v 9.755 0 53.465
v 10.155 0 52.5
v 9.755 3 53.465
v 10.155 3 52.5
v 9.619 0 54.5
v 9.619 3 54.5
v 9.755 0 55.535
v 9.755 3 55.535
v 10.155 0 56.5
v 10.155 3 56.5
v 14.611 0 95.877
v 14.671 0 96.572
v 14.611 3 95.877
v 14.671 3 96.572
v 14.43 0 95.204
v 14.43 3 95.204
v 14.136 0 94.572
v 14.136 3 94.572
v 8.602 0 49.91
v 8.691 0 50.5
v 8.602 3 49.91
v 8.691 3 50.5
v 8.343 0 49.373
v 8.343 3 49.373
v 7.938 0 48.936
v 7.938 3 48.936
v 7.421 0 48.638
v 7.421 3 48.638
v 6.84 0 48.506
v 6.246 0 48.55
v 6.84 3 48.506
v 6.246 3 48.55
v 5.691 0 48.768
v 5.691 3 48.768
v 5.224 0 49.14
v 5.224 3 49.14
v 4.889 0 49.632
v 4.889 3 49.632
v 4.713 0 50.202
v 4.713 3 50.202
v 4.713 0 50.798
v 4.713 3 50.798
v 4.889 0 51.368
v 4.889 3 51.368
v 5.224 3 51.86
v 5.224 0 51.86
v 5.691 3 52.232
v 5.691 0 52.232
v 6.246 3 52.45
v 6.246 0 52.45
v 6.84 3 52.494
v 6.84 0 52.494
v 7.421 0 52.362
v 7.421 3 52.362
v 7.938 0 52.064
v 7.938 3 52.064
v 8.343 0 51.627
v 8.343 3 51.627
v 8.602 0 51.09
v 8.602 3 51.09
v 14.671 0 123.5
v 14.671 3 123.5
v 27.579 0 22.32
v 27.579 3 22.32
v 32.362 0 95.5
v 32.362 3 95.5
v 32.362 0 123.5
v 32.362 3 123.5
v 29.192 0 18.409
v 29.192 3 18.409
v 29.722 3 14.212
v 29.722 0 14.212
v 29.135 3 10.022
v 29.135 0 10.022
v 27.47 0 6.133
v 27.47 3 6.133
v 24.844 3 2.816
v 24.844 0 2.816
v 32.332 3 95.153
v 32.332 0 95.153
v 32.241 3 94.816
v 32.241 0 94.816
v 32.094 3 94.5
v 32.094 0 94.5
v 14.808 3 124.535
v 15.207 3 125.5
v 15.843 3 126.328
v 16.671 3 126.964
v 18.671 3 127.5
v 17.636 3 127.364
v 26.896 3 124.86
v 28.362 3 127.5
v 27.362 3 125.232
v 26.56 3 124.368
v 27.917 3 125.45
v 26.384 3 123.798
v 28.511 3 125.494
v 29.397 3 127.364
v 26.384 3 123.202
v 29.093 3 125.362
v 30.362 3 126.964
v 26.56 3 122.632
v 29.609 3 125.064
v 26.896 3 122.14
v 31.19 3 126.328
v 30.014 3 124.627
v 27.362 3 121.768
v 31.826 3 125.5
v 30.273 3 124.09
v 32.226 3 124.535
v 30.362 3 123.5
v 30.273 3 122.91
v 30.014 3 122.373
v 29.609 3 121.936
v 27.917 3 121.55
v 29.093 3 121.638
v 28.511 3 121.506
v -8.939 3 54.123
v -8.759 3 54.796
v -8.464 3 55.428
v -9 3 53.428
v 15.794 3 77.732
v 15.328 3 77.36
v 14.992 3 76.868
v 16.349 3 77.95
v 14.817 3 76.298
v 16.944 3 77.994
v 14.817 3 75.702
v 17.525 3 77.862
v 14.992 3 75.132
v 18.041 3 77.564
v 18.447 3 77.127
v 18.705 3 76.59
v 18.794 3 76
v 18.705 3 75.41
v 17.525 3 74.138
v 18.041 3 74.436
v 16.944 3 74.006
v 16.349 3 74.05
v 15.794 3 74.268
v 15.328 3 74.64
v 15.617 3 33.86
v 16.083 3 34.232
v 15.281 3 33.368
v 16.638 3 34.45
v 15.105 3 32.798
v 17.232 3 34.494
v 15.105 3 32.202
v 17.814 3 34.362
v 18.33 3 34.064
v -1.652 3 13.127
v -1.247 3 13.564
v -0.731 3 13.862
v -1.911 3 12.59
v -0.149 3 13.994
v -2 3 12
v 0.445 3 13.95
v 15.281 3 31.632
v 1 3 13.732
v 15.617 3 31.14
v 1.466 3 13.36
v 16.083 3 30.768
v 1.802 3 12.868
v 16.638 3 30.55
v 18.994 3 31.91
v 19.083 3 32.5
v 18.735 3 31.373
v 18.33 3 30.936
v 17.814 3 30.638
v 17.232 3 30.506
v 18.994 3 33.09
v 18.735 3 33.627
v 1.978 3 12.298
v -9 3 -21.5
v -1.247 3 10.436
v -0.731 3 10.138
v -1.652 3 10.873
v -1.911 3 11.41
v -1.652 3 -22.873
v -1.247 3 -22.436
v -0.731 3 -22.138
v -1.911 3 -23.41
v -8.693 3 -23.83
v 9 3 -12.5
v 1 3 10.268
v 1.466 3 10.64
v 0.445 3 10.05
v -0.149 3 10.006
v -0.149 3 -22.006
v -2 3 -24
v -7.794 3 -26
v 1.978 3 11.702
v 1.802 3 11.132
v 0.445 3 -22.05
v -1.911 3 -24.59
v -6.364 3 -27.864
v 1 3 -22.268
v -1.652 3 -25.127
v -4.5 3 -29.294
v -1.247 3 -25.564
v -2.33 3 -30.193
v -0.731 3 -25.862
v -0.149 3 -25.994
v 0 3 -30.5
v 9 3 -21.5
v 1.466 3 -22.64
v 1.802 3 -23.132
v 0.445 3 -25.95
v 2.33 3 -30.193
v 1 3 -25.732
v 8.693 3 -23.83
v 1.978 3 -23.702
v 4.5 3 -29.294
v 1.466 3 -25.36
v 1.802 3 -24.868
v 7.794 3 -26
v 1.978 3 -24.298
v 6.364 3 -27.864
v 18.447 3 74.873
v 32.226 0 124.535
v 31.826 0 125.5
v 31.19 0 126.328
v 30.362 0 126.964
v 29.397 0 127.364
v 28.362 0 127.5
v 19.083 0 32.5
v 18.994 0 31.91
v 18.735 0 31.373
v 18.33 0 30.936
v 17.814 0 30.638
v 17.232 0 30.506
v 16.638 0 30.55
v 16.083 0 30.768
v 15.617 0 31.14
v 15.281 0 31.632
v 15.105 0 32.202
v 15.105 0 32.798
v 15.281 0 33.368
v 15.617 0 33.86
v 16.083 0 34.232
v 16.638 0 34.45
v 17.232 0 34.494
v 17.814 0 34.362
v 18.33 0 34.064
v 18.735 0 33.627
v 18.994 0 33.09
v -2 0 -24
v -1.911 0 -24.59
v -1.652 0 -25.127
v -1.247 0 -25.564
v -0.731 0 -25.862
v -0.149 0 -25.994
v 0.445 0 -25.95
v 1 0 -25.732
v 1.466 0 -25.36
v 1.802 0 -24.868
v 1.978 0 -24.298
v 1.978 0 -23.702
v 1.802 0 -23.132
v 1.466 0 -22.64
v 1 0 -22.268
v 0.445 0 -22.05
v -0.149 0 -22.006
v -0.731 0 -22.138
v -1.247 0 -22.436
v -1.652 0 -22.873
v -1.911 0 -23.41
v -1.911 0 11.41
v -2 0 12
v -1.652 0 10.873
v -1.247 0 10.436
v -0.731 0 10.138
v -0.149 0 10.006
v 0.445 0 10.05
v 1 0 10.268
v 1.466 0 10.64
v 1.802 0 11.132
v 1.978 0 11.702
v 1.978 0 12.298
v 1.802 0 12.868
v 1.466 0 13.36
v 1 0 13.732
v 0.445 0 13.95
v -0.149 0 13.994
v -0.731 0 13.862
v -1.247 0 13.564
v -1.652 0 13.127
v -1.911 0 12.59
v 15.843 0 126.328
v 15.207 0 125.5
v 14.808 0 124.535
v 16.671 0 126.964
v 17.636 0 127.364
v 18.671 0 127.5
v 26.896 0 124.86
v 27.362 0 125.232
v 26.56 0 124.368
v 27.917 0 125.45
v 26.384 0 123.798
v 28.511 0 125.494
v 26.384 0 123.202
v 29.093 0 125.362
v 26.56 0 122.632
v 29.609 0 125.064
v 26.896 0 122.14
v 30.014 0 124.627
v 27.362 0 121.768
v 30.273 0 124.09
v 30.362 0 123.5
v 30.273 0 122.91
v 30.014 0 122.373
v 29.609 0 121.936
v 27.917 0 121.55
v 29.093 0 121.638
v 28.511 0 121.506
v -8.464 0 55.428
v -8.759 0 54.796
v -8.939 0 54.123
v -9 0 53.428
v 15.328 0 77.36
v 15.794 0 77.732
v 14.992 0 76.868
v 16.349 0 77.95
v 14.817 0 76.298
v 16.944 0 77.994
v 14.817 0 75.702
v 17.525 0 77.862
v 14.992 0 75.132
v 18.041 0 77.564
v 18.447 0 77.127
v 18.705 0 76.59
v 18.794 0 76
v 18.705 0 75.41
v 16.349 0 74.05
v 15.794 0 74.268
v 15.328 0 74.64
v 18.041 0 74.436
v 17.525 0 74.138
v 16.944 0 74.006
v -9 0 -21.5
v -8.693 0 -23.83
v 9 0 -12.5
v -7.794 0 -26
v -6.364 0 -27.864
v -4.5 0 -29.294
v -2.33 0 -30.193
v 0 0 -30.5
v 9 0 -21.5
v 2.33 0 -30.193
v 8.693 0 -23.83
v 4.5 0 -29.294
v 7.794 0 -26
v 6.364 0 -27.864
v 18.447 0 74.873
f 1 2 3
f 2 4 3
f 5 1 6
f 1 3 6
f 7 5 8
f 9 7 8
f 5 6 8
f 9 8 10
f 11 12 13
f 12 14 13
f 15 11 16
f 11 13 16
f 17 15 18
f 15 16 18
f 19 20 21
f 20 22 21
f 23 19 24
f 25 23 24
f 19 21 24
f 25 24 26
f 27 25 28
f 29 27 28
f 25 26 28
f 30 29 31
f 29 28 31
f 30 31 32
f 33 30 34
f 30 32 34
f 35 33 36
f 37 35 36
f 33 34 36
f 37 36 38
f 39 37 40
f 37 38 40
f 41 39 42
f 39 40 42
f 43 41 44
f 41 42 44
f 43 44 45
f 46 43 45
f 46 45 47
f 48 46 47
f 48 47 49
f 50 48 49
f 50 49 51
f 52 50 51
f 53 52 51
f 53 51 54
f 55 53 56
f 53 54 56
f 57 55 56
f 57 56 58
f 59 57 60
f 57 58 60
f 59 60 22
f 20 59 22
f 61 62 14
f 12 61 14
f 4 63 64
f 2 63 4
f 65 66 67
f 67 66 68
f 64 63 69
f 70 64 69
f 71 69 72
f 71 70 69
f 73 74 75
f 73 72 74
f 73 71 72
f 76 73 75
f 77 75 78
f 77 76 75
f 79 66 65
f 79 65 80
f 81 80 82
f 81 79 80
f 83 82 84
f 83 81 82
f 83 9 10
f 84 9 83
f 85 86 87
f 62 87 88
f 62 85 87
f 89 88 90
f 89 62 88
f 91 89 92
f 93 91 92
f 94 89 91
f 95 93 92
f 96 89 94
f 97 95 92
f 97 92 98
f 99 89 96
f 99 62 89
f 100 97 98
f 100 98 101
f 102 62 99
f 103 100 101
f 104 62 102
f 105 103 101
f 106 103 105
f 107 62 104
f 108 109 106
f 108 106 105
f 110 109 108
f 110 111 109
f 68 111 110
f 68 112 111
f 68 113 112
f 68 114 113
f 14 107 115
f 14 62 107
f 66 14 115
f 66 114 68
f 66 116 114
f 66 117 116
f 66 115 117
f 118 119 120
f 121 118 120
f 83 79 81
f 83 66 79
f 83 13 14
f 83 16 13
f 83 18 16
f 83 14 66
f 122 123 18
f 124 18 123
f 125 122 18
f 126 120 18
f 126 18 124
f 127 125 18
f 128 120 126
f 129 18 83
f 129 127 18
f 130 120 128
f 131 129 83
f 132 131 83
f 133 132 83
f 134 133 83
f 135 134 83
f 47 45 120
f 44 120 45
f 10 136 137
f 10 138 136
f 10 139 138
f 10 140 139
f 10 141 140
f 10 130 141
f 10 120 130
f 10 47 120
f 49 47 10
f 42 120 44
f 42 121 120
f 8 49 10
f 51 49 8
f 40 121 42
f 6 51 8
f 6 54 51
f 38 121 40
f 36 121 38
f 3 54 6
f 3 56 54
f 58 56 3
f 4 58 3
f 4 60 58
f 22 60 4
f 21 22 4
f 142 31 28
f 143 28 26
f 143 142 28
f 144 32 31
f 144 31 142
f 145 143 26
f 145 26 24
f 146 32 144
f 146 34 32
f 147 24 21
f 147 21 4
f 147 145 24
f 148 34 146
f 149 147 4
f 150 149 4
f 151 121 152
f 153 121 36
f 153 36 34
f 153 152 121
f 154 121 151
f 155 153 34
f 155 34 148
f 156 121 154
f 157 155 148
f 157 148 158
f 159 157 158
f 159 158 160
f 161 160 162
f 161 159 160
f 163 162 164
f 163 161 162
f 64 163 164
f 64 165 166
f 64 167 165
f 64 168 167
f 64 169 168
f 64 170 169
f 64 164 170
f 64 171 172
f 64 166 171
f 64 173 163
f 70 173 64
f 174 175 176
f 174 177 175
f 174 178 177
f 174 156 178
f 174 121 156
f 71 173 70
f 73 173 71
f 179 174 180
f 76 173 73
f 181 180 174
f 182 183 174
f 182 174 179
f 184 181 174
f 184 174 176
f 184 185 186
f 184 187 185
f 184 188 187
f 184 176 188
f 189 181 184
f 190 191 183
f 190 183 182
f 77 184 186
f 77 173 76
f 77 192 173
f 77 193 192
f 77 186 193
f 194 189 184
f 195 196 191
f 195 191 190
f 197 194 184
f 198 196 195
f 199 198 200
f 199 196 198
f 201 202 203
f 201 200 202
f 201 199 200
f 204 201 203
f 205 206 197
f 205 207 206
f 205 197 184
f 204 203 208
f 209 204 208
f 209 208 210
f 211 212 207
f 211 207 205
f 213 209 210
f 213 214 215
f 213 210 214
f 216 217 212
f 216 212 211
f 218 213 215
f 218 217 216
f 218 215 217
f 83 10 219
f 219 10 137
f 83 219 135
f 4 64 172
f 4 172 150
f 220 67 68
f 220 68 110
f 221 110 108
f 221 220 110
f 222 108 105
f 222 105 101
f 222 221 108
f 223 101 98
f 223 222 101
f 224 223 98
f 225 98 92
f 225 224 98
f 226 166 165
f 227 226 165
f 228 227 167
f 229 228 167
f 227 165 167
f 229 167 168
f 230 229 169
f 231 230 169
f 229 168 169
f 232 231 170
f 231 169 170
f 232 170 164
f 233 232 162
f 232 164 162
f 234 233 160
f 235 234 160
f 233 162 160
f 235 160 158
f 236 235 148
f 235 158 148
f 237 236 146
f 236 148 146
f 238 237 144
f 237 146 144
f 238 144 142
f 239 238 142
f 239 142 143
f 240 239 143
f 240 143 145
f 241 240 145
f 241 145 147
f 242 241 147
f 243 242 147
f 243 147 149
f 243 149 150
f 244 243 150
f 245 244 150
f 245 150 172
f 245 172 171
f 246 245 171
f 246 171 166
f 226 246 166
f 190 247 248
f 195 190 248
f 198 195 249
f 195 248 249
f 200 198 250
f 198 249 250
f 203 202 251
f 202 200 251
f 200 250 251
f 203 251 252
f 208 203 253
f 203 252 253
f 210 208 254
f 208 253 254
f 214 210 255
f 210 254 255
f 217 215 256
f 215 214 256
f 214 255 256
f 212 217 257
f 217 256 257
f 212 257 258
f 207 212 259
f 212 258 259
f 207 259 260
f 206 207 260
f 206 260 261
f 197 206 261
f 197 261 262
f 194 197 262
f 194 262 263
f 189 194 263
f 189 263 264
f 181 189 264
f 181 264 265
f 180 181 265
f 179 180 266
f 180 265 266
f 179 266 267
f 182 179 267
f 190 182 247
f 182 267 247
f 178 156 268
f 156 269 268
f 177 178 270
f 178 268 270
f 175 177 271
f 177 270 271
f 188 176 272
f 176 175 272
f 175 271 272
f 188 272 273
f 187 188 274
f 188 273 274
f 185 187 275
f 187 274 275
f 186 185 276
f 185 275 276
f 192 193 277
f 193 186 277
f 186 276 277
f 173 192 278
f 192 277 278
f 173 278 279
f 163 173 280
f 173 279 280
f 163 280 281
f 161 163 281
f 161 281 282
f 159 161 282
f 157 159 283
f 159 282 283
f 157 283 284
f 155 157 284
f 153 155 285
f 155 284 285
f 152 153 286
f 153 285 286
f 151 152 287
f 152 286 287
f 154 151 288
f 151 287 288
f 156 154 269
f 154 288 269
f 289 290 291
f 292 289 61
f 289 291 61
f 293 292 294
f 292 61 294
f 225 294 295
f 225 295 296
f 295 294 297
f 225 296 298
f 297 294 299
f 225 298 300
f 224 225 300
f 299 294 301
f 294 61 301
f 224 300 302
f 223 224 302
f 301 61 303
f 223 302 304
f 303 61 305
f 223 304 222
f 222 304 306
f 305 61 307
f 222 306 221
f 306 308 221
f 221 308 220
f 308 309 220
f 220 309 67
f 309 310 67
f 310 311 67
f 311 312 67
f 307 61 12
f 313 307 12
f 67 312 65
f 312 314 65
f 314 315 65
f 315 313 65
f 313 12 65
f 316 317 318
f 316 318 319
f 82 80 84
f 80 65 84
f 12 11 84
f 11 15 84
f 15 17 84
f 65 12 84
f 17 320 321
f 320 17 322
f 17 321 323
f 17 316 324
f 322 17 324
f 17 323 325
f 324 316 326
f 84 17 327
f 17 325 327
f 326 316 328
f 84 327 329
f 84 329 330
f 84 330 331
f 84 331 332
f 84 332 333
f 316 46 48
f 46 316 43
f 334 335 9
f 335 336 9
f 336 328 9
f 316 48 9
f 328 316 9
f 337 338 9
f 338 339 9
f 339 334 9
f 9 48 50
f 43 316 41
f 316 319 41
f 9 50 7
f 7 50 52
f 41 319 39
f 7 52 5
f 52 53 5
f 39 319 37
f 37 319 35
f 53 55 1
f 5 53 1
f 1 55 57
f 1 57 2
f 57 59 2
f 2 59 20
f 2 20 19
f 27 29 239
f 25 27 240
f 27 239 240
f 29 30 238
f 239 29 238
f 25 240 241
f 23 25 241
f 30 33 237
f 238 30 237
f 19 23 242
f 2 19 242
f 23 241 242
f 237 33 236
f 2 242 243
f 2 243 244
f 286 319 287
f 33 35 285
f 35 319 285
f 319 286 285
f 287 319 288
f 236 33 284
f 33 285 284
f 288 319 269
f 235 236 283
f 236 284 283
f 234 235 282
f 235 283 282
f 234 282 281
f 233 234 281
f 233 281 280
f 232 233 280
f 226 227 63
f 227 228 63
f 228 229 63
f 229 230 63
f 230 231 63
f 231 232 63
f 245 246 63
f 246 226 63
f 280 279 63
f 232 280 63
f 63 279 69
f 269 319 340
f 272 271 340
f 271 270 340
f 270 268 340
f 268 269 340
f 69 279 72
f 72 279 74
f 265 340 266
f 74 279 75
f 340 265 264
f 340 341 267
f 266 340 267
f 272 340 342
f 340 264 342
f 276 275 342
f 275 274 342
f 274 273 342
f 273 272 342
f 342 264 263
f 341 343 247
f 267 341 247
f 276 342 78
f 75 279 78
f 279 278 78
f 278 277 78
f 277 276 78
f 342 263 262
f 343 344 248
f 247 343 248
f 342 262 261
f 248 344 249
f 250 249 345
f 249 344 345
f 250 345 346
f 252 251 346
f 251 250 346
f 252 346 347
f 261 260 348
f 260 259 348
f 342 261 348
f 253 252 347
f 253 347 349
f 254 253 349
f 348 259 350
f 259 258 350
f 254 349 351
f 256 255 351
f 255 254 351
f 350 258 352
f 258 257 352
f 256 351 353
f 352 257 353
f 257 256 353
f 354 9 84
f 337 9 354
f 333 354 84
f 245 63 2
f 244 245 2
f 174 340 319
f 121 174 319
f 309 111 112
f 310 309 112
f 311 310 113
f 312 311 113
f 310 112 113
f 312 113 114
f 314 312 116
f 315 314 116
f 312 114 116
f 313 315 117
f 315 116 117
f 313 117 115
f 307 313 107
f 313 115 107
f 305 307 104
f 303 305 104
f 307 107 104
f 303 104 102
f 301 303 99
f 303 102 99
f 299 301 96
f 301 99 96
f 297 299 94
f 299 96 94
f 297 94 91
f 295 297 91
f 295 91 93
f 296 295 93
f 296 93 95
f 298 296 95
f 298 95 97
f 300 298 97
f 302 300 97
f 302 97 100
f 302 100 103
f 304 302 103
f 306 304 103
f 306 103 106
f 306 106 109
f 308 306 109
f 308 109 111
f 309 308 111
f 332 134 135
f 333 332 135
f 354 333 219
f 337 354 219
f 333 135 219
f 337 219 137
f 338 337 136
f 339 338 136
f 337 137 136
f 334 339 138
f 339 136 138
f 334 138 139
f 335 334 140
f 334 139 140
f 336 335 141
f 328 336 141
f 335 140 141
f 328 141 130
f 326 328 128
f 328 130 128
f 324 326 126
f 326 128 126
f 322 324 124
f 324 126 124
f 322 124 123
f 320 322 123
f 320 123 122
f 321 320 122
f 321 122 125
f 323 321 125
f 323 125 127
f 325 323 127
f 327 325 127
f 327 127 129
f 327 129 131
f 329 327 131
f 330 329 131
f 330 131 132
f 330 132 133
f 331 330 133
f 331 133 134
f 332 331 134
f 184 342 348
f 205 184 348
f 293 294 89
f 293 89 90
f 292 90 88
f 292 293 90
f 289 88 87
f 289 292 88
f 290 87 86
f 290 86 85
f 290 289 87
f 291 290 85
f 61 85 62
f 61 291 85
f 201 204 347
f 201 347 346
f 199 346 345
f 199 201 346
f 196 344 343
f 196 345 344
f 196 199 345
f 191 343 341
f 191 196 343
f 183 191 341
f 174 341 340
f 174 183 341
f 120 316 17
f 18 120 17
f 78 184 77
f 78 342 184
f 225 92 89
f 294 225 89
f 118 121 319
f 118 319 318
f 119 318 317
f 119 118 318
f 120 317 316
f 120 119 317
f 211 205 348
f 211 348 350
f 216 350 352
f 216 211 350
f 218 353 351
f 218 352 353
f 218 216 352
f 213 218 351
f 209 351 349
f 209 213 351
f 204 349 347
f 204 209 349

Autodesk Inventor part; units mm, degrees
ref_plane "YZ Plane" through (0, 0, 0) normal (1, 0, 0) x (0, 1, 0)
ref_plane "XZ Plane" through (0, 0, 0) normal (0, 1, 0) x (-1, 0, 0)
ref_plane "XY Plane" through (0, 0, 0) normal (0, 0, 1) x (1, 0, 0)
sketch "Sketch1" plane through (0, 0, 0) normal (0, 1, 0) x (-1, 0, 0)
  line L0 (9, 30.5) -> (-9, 30.5) construction
  line L1 (-9, 30.5) -> (-9, -12.5) construction
  line L2 (-9, -30.5) -> (9, -30.5)
  line L3 (9, 30.5) -> (-9, -30.5) construction
  line L4 (-9, 30.5) -> (9, -30.5) construction
  circle A0 centre (0, -24) radius 2
  circle A1 centre (0, 12) radius 2
  line L5 (9, 30.5) -> (-9, 30.5) construction
  line L6 (-33.8261, 11.5) -> (-15.8261, 11.5) construction
  line L7 (-33.8261, 11.5) -> (-9, 54.5)
  line L8 (-15.8261, 11.5) -> (14.1464, 63.4139) construction
  line L9 (-9, 54.5) -> (-33.8261, 97.5)
  line L10 (9, 54.5) -> (-15.8261, 97.5)
  line L11 (-33.8261, 97.5) -> (-15.8261, 97.5)
  line L12 (-15.8261, 11.5) -> (9, 11.5) construction
  line L13 (-9, -12.5) -> (-33.8261, 11.5)
  line L14 (-9, -12.5) -> (-9, -30.5)
  line L15 (9, -30.5) -> (9, 11.5)
  line L16 (9, 11.5) -> (9, 54.5)
  point P0 (0, 0)
  dimension "d0" = 18
  dimension "d1" = 61
  dimension "d2" = 4
  dimension "d3" = 24
  dimension "d4" = 4
  dimension "d5" = 36
  dimension "d8" = 18
  dimension "d9" = 43
  dimension "d10" = 60
  dimension "d11" = 120
  dimension "d14" = 18
  dimension "d15" = 24
extrude "Extrusion1" add sketch "Sketch1" along normal blind 3
fillet "Fillet1" radius 16 1 edges at (33.8261, 1.5, 11.5)
fillet "Fillet2" radius 4 1 edges at (9, 1.5, 54.5)
fillet "Fillet3" radius 2 1 edges at (33.8261, 1.5, 97.5)
fillet "Fillet4" radius 4 2 edges at (15.8261, 1.5, 97.5) (-9, 1.5, 54.5)
fillet "Fillet5" radius 9 2 edges at (9, 1.5, -30.5) (-9, 1.5, -30.5)
sketch "Sketch2" plane through (0, 3, 0) normal (0, 1, 0) x (1, 0, 0)
  arc A0 (9, 21.5) -> (-9, 21.5) centre (0, 21.5) ccw construction
  line L0 (-9, 21.5) -> (-9, -53.4282) construction
  arc A1 (-9, -53.4282) -> (-8.4641, -55.4282) centre (-5, -53.4282) ccw construction
  line L1 (-8.4641, -55.4282) -> (14.6714, -95.5) construction
  arc A2 (14.6714, -95.5) -> (18.1355, -97.5) centre (18.1355, -93.5) ccw construction
  line L2 (18.1355, -97.5) -> (30.362, -97.5) construction
  arc A3 (30.362, -97.5) -> (32.094, -94.5) centre (30.362, -95.5) ccw construction
  line L3 (32.094, -94.5) -> (10.1547, -56.5) construction
  arc A4 (10.1547, -52.5) -> (10.1547, -56.5) centre (13.6188, -54.5) ccw construction
  line L4 (10.1547, -52.5) -> (27.5792, -22.3198) construction
  arc A5 (27.5792, -22.3198) -> (24.8435, -2.8164) centre (13.7228, -14.3198) ccw construction
  line L5 (24.8435, -2.8164) -> (9, 12.5) construction
  line L6 (9, 12.5) -> (9, 21.5) construction
  circle A6 centre (0, -12) radius 2 construction
  circle A7 centre (0, 24) radius 2 construction
  line L7 (5.6099, 10.2137) -> (22.0634, -5.6922) construction
  arc A8 (24.1151, -20.3198) -> (22.0634, -5.6922) centre (13.7228, -14.3198) ccw construction
  line L8 (24.1151, -20.3198) -> (6.6906, -50.5) construction
  arc A9 (6.6906, -50.5) -> (6.6906, -58.5) centre (13.6188, -54.5) ccw construction
  line L9 (6.6906, -58.5) -> (26.8979, -93.5) construction
  line L10 (26.8979, -93.5) -> (18.1355, -93.5)
  line L11 (18.1355, -93.5) -> (-5, -53.4282)
  line L12 (-5, -53.4282) -> (-5, 21.5)
  arc A10 (5, 21.5) -> (-5, 21.5) centre (0, 21.5) ccw
  line L13 (5, 21.5) -> (5, 11.6517) construction
  circle A11 centre (5, 10.8034) radius 2
  arc A12 (5, 11.6517) -> (5.6099, 10.2137) centre (7, 11.6517) ccw construction
  circle A13 centre (22.0634, -5.6922) radius 2
  circle A14 centre (17.0829, -32.5) radius 2
  circle A15 centre (6.6906, -50.5) radius 2
  circle A16 centre (26.8979, -93.5) radius 2
  circle A17 centre (16.7942, -76) radius 2
  point P0 (0, 0)
  dimension "d22" = 4
  dimension "d23" = 4
  dimension "d26" = 2
  dimension "d27" = 4
  dimension "d28" = 4
  dimension "d29" = 4
  dimension "d30" = 4
  dimension "d40" = 18
  dimension "d41" = 4
sketch "Sketch3" plane through (0, 3, 0) normal (0, 1, 0) x (1, 0, 0)
  arc A0 (30.362, -97.5) -> (32.094, -94.5) centre (30.362, -95.5) ccw projected
  line L0 (32.362, -95.5) -> (32.362, -127.5)
  line L1 (32.362, -127.5) -> (14.6714, -127.5)
  arc A1 (14.6714, -95.5) -> (18.1355, -97.5) centre (18.1355, -93.5) ccw projected
  line L2 (14.6714, -127.5) -> (14.6714, -95.5)
  line L3 (18.1355, -97.5) -> (30.362, -97.5) projected
  point P0 (0, 0)
  dimension "d31" = 32
extrude "Extrusion3" add sketch "Sketch3" against normal up to surface (3 mm away)
fillet "Fillet6" radius 4 3 edges at (14.6714, 1.5, 95.5) (14.6714, 1.5, 127.5) (32.362, 1.5, 127.5)
extrude "Extrusion2" cut sketch "Sketch2" against normal through all contours A14 | A15 | A17
sketch "Sketch4" plane through (0, 3, 0) normal (0, 1, 0) x (1, 0, 0)
  circle A0 centre (28.362, -123.5) radius 2
  line L0 (32.362, -123.5) -> (32.362, -95.5) projected
  line L1 (18.6714, -127.5) -> (28.362, -127.5) projected
  point P0 (0, 0)
  dimension "d35" = 4
  dimension "d36" = 4
  dimension "d37" = 4
extrude "Extrusion4" cut sketch "Sketch4" against normal through all
equation "\"d11\" = 2 * d10"
properties part number "ClawGrabPlate" material "Aluminum 6061"
